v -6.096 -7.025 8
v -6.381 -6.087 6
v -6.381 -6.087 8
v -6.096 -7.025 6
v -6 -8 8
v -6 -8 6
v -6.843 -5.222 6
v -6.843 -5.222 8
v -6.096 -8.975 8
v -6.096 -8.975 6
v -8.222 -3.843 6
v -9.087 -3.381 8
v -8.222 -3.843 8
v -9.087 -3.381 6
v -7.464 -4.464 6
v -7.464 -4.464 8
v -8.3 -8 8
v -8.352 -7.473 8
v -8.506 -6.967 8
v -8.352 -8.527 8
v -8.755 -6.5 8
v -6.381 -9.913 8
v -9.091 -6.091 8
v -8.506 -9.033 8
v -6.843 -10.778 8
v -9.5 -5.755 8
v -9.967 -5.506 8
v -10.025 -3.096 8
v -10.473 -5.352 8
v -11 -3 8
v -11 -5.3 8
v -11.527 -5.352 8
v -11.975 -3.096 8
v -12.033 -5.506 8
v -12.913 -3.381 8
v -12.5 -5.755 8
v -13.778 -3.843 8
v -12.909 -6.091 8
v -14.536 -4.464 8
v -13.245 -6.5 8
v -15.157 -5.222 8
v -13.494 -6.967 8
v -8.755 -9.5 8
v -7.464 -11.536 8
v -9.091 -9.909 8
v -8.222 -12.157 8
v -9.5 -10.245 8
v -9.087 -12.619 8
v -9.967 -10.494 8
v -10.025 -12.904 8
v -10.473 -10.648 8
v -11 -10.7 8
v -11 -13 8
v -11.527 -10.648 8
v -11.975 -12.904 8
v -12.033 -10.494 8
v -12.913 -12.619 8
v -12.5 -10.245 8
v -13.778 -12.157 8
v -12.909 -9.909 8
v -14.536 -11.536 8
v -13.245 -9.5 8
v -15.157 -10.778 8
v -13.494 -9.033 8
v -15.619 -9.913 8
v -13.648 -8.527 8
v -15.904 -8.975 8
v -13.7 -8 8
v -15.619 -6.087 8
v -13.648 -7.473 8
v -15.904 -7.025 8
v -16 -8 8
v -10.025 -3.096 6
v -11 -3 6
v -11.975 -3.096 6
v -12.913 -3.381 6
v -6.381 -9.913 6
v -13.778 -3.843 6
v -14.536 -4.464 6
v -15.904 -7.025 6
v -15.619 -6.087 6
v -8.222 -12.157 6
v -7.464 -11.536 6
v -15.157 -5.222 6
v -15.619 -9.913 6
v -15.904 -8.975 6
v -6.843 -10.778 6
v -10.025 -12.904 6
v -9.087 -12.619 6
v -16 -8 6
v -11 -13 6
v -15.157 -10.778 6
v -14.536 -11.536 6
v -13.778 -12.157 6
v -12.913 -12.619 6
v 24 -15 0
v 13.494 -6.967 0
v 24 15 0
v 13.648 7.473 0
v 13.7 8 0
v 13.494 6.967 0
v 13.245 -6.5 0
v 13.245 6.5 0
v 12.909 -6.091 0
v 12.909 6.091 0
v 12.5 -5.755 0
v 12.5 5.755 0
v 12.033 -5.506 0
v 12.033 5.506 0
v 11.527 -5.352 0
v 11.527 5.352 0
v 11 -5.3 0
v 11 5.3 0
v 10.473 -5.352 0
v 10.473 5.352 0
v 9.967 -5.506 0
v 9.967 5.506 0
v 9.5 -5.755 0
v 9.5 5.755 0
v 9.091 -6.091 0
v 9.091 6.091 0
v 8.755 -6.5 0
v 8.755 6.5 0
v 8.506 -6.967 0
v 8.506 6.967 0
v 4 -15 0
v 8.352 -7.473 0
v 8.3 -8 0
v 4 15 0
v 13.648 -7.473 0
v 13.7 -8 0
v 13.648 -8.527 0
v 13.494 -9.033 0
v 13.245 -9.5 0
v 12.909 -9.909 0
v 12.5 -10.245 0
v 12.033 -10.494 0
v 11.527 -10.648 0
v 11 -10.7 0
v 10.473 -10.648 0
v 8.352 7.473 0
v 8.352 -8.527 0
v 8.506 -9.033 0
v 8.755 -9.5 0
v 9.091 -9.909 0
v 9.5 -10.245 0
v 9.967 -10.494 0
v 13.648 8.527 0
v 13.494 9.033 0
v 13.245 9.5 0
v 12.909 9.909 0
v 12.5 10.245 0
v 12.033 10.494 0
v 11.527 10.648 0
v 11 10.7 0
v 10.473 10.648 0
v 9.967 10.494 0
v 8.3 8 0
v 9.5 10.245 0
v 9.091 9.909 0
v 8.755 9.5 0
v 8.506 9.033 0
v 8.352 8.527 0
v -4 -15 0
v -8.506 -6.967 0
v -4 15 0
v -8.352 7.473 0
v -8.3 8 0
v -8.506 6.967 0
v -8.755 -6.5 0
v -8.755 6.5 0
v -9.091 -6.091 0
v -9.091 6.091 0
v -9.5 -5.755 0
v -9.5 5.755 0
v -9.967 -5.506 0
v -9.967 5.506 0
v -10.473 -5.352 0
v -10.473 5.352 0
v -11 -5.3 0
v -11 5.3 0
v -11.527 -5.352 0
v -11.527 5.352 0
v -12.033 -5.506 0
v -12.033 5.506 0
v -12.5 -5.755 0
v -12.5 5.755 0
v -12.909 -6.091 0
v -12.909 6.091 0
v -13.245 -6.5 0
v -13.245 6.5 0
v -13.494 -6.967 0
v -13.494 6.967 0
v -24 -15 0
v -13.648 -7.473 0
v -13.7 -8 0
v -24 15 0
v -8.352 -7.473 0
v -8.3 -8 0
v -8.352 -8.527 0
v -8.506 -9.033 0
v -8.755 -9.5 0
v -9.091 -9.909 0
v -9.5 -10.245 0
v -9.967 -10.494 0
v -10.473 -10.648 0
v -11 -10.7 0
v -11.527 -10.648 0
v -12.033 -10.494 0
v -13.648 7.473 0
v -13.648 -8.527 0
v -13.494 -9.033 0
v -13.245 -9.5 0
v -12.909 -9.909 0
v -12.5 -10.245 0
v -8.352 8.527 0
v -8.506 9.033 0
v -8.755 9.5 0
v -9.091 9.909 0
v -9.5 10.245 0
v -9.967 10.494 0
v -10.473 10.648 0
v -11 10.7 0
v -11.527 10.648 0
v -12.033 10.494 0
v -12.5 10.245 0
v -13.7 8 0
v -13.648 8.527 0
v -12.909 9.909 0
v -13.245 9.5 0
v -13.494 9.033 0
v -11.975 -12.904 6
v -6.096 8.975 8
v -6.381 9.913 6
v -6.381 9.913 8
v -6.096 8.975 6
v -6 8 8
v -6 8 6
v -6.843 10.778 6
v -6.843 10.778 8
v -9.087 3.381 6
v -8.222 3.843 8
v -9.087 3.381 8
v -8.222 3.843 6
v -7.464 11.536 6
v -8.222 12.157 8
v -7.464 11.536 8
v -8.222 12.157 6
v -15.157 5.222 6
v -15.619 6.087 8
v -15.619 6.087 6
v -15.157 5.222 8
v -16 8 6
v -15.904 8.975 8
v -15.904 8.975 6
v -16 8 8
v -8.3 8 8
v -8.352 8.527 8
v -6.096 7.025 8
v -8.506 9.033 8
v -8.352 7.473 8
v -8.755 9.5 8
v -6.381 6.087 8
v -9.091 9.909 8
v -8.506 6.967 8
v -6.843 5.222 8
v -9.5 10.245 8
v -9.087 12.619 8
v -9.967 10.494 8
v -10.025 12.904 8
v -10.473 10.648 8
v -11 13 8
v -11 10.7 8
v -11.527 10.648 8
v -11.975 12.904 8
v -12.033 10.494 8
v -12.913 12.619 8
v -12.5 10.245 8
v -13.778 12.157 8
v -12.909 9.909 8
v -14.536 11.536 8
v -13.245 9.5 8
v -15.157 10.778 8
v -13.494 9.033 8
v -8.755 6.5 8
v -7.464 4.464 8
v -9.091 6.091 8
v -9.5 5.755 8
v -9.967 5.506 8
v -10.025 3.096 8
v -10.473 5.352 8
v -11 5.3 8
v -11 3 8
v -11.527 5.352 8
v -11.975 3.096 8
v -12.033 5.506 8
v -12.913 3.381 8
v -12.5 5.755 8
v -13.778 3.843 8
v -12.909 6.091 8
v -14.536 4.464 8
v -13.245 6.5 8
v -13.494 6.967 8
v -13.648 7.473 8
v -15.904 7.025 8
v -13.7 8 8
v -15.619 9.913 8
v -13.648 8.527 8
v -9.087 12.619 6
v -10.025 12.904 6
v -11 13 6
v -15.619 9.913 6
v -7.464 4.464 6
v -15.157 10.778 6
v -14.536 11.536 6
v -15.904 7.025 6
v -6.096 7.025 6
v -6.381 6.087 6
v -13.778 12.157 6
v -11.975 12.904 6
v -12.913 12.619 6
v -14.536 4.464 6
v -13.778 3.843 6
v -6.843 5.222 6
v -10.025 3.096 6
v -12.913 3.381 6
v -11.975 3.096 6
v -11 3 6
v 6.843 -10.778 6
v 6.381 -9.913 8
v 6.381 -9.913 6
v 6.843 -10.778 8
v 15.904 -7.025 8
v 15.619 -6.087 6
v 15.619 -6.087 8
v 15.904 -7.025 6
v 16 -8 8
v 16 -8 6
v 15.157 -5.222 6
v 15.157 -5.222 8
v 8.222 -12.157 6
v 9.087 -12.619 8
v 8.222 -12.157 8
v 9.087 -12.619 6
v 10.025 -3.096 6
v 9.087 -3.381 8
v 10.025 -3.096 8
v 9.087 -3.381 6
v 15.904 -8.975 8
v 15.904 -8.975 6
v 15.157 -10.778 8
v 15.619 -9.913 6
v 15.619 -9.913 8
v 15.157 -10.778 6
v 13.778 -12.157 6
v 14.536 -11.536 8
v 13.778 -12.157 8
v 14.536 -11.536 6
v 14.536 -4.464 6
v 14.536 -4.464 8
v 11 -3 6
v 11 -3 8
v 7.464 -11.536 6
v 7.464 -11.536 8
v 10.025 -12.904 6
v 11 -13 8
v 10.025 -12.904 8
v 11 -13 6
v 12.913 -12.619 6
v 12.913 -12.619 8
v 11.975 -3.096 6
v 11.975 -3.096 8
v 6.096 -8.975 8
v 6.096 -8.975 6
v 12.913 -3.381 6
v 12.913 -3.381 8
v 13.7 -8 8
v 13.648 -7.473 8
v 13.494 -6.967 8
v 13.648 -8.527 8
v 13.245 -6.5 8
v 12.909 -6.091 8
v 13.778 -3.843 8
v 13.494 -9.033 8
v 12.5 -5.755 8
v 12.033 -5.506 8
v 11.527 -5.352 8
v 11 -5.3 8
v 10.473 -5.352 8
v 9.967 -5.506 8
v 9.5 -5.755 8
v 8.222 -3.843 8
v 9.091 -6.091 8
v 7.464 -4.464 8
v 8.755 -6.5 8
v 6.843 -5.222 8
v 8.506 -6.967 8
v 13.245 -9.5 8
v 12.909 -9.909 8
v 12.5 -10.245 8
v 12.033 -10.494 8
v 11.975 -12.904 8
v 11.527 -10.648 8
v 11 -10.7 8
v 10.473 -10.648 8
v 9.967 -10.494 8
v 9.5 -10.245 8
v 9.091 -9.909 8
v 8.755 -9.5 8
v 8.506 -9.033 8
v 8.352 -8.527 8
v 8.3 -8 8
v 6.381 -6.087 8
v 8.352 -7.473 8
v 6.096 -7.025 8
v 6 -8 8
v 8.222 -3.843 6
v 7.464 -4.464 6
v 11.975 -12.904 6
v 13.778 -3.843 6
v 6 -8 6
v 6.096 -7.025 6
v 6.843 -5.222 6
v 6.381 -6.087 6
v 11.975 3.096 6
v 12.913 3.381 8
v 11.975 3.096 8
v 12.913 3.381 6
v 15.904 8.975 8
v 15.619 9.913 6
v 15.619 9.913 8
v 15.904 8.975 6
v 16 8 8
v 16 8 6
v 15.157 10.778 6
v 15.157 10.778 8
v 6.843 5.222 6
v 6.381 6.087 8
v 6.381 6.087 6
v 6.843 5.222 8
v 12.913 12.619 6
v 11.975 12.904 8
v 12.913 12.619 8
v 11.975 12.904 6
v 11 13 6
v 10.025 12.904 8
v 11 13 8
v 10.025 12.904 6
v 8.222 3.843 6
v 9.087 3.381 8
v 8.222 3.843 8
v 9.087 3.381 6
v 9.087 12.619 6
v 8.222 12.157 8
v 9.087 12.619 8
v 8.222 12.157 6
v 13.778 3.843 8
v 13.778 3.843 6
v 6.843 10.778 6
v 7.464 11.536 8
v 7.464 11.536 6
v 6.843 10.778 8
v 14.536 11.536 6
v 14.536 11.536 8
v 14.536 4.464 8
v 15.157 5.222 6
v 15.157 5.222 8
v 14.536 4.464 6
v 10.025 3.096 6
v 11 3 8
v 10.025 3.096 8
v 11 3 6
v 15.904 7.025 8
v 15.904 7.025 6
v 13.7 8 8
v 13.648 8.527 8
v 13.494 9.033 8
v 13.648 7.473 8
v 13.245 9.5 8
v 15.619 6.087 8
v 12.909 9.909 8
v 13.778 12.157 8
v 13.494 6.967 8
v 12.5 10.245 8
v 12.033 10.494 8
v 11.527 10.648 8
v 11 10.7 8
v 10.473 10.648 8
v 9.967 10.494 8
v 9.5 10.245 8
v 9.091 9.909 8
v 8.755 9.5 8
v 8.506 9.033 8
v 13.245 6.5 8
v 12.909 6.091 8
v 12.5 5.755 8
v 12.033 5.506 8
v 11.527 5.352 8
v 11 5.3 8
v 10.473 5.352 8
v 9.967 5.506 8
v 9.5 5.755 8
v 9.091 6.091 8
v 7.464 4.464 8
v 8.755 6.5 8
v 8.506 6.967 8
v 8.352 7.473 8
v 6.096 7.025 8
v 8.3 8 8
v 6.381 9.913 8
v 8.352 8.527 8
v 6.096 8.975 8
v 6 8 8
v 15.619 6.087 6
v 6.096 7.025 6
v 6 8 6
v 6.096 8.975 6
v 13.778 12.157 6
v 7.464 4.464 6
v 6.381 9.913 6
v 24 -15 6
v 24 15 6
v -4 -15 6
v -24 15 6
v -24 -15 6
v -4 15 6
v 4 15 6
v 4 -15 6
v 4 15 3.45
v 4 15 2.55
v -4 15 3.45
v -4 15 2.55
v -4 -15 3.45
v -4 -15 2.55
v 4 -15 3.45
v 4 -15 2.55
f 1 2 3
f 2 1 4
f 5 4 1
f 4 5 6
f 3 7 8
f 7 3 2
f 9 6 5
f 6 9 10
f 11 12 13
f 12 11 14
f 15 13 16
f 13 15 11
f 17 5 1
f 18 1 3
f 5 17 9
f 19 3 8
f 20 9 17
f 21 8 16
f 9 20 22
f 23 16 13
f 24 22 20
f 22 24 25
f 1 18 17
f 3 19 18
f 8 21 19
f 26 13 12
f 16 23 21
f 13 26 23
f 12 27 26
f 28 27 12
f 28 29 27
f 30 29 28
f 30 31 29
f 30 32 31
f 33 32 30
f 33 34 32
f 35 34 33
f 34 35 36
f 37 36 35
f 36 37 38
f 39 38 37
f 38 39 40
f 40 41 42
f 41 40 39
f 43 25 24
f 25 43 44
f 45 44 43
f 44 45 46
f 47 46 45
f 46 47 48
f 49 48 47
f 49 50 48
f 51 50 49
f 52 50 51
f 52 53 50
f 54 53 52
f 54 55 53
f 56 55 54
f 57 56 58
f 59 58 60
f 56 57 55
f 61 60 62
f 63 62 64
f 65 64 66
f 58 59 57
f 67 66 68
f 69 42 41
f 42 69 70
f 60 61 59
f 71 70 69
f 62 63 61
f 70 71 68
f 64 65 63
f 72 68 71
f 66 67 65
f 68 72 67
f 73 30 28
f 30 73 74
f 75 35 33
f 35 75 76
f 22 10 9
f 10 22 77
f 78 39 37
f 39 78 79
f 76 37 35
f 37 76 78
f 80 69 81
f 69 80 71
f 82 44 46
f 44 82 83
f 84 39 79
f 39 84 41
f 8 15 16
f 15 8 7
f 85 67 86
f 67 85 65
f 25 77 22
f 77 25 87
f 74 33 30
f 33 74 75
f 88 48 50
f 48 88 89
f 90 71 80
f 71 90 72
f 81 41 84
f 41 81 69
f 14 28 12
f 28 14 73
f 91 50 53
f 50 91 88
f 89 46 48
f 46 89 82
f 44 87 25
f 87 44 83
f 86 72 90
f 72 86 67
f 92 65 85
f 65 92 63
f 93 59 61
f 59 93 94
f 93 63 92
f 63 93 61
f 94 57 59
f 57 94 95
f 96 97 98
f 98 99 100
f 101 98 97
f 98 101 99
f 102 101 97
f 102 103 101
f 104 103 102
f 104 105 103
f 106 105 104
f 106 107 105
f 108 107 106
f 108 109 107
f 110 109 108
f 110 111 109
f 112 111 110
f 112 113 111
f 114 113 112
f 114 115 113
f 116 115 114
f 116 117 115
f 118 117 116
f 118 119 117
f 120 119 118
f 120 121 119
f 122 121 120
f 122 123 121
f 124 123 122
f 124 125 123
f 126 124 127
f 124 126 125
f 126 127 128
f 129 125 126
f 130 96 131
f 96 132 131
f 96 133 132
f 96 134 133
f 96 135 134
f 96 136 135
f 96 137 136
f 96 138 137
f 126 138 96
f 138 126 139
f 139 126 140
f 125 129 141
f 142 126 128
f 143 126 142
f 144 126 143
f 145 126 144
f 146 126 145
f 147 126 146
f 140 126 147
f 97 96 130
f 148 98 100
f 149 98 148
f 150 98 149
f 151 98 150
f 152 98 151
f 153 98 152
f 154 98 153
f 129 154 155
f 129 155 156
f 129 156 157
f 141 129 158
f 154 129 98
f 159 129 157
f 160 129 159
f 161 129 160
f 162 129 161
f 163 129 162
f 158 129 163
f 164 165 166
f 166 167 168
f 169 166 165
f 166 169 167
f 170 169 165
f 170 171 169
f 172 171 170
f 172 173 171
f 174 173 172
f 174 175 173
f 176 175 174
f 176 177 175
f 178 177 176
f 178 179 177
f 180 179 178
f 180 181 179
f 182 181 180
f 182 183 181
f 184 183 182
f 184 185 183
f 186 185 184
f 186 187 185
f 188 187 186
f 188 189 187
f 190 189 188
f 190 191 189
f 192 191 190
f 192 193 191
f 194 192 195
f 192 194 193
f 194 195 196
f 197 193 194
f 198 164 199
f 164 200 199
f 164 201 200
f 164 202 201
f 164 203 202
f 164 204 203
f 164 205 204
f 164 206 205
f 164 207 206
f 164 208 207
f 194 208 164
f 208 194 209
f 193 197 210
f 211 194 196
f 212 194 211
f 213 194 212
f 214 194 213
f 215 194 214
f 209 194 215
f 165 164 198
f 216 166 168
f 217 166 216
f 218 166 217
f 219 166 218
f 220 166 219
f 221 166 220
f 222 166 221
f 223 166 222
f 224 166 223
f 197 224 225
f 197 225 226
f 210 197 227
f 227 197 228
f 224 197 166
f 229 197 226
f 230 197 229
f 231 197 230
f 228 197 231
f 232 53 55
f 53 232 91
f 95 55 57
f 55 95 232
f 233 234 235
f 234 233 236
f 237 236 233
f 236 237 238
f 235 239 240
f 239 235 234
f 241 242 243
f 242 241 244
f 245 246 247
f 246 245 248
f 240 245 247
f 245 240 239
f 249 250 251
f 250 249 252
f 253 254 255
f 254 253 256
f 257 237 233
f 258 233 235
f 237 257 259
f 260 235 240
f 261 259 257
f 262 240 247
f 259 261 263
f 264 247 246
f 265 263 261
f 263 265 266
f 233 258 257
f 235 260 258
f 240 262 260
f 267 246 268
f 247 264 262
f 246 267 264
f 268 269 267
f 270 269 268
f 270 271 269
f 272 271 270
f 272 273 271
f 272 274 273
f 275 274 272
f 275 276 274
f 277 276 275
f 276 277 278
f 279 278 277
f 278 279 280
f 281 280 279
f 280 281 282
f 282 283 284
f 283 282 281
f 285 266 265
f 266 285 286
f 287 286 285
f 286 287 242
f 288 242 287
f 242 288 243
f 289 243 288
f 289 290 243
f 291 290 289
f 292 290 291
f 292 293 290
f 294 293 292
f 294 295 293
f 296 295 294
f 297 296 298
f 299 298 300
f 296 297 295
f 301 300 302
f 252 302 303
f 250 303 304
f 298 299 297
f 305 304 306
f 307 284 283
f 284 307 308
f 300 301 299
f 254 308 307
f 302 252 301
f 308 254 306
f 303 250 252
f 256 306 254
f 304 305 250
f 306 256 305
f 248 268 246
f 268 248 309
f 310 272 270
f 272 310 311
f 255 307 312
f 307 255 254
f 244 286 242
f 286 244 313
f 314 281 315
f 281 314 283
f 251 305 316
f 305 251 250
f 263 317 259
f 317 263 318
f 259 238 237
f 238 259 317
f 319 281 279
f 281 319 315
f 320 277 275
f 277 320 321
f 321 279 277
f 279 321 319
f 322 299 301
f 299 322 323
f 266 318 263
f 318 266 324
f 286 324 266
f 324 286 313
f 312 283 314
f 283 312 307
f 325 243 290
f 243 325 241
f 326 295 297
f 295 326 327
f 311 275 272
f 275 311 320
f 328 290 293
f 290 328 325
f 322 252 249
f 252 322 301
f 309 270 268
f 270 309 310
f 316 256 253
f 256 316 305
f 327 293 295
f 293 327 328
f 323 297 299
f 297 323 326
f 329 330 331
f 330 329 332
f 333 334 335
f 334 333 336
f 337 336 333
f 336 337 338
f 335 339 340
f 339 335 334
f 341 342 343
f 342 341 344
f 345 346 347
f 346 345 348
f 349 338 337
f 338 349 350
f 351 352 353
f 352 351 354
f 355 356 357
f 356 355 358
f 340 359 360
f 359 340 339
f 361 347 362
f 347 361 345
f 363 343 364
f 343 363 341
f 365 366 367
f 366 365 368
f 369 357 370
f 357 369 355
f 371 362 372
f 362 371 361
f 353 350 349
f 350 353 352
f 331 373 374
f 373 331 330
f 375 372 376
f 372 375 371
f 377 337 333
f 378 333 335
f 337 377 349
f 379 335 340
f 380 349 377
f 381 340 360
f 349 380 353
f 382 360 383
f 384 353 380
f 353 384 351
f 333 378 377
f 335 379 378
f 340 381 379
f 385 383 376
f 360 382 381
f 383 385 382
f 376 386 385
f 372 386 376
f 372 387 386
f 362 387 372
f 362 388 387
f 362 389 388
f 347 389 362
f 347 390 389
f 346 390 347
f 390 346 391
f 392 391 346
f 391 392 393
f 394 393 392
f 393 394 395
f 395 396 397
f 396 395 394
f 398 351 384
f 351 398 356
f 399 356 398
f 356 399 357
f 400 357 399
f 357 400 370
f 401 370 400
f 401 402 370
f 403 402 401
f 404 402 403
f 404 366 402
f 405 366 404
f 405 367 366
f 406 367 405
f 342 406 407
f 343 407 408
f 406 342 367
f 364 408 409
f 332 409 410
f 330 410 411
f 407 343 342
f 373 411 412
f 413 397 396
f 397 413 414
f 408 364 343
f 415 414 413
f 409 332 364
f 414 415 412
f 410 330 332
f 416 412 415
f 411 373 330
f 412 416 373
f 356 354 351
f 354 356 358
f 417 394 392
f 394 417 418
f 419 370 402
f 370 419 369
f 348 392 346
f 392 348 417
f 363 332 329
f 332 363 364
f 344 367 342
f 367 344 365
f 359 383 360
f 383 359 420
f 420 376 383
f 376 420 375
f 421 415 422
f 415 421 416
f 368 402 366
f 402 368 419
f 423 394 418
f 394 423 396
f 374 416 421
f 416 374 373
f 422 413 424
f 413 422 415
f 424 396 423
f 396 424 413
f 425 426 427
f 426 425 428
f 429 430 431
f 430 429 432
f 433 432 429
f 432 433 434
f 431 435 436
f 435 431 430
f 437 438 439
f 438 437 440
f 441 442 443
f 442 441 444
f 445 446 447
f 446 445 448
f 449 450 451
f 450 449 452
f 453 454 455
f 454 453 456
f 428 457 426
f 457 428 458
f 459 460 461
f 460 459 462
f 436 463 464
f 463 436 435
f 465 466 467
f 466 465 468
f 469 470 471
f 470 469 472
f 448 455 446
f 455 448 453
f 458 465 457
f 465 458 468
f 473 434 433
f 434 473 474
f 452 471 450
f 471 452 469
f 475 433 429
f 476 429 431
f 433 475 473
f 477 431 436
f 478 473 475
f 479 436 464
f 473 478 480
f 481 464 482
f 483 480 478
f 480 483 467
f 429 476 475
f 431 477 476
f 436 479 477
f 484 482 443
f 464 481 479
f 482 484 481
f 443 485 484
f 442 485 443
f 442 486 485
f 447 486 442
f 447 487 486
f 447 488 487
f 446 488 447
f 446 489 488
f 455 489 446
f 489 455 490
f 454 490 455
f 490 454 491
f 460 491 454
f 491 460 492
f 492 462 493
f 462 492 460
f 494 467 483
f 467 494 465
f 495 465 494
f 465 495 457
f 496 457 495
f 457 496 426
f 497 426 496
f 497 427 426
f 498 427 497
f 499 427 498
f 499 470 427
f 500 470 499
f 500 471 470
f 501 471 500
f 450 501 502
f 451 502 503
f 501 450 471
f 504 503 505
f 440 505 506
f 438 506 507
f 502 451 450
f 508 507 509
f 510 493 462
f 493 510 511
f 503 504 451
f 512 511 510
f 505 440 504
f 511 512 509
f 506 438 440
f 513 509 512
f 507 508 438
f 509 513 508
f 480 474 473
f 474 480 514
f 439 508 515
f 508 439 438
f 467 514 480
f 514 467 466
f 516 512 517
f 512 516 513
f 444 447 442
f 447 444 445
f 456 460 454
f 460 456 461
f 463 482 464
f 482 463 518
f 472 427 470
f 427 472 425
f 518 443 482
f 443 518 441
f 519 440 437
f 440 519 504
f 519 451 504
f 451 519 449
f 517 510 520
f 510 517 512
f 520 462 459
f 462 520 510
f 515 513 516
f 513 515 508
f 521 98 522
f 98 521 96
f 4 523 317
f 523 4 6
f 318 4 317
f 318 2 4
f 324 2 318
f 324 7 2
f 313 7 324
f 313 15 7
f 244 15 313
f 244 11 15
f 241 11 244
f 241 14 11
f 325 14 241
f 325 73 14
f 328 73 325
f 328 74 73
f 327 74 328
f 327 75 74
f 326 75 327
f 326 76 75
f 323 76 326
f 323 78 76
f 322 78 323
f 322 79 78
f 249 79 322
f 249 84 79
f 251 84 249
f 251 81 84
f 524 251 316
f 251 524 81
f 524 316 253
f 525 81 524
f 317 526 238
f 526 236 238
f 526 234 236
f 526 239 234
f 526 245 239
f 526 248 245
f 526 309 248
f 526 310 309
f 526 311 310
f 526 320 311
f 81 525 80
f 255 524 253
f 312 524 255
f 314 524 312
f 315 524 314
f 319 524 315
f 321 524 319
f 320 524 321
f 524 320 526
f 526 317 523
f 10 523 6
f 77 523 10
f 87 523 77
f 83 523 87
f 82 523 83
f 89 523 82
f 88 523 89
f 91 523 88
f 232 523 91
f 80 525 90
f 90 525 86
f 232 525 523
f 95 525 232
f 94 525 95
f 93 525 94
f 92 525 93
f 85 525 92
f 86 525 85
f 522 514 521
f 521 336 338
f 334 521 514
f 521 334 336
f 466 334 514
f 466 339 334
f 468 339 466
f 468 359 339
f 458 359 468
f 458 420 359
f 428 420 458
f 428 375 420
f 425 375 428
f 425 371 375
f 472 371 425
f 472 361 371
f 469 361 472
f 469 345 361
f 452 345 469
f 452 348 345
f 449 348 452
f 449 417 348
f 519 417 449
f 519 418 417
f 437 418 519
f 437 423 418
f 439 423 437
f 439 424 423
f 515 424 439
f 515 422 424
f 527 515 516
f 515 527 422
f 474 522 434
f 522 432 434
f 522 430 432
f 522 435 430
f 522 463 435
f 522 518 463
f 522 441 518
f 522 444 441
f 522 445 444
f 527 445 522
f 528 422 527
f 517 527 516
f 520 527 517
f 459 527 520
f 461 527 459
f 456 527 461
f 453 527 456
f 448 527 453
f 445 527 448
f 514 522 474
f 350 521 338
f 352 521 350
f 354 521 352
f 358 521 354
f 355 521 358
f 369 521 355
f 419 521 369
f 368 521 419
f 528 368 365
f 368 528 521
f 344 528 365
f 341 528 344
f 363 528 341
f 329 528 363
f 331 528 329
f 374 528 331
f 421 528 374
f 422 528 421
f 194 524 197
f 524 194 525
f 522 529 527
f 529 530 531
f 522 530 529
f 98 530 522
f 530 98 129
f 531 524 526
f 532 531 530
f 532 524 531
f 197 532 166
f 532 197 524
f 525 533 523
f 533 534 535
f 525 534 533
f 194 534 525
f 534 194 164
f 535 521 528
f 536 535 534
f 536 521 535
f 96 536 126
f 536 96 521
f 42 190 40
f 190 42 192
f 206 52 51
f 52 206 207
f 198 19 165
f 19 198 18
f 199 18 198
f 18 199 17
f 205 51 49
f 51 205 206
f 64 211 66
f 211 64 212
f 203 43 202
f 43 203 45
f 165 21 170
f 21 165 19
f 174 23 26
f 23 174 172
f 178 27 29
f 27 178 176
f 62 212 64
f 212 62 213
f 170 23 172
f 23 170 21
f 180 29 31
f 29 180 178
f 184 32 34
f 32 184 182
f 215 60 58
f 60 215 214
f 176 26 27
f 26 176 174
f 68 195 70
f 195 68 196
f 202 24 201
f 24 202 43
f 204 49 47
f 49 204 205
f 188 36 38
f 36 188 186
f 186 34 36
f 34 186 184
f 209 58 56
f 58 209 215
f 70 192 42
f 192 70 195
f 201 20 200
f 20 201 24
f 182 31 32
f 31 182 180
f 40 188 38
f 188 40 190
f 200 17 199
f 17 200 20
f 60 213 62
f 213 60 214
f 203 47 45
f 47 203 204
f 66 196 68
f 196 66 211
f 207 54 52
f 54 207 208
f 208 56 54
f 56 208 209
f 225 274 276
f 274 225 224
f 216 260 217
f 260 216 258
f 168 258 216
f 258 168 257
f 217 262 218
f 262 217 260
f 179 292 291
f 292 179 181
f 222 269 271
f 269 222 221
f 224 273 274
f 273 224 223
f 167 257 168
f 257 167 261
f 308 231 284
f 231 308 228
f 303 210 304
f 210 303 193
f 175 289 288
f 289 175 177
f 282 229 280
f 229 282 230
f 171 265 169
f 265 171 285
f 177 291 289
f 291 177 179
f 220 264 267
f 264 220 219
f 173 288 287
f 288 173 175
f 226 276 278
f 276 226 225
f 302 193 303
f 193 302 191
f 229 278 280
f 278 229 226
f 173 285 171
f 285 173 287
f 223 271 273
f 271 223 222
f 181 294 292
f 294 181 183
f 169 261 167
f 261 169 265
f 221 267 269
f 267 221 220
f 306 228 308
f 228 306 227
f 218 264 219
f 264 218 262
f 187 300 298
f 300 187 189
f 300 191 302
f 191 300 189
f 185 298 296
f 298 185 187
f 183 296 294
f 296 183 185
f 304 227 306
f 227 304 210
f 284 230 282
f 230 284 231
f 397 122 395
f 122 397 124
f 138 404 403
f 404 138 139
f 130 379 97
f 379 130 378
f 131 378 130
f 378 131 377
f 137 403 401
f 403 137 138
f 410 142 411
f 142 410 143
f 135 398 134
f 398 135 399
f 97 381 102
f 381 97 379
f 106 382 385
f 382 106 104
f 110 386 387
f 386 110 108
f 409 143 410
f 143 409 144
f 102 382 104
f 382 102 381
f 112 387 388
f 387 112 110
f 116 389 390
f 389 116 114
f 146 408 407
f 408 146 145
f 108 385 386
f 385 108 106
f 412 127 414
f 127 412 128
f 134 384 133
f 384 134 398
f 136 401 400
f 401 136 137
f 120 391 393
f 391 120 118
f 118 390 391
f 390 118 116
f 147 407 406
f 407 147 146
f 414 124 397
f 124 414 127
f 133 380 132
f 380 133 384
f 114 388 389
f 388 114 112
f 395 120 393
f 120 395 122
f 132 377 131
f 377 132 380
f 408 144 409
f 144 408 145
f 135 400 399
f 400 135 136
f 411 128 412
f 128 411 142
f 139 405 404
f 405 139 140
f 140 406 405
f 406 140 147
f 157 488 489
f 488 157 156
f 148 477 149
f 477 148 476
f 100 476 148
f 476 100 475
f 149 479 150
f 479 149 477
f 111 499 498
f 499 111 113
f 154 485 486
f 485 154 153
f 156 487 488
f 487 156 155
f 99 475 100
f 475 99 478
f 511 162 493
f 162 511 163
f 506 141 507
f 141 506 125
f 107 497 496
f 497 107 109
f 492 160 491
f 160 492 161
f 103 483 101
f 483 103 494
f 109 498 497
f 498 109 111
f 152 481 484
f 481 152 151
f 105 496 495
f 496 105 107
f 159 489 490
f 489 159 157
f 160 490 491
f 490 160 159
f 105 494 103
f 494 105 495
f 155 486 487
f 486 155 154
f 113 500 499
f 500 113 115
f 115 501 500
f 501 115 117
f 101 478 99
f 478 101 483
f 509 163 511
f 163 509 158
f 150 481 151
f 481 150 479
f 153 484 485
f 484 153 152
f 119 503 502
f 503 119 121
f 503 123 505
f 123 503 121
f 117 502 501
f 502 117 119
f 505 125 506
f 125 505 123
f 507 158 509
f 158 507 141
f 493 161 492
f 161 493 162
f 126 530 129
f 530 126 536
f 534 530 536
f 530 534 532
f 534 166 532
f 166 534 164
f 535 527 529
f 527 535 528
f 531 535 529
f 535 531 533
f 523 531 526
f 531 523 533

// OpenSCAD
$fn = 32;

// ----------------------------------------------------------------------
// Living hinge: 48 x 30 mm plates, 0.9 mm flexible web
// ----------------------------------------------------------------------

// --- parameters (mm) ---
plate_len = 20;           // plate length outside the web
plate_w = 30;             // plate width
thick = 6;                // plate thickness
web_half = 4;             // half width of the flex band
web_t = 0.9;              // flexible web thickness
web_z = 2.55;             // web position inside the thickness
boss_d = 10;              // screw boss diameter
boss_h = 8;               // screw boss height
boss_x = 11;              // screw boss distance from the web
screw_d = 5.4;            // screw hole

difference() {
  union() {
    /* one flat strip, later thinned at the middle */
    translate([-24, -15, 0]) cube([48, 30, 6]);
    /* screw bosses, sunk 0.5 mm into the plates */
    for (sx = [-11, 11]) {
      for (sy = [-8, 8]) {
        translate([sx, sy, 0]) cylinder(h = boss_h, d = boss_d);
      }
    }
  }
  /* channel from below: leaves the web on top of it */
  translate([-4, -17.5, -2.5]) cube([8, 35, 5.05]);
  /* channel from above: thins the web down to web_t */
  translate([-4, -17.5, 3.45]) cube([8, 35, 5.05]);
  /* screw holes through the bosses */
  for (sx = [-11, 11]) {
    for (sy = [-8, 8]) {
      translate([sx, sy, -2.5]) cylinder(h = boss_h + 5, d = screw_d);
    }
  }
}
